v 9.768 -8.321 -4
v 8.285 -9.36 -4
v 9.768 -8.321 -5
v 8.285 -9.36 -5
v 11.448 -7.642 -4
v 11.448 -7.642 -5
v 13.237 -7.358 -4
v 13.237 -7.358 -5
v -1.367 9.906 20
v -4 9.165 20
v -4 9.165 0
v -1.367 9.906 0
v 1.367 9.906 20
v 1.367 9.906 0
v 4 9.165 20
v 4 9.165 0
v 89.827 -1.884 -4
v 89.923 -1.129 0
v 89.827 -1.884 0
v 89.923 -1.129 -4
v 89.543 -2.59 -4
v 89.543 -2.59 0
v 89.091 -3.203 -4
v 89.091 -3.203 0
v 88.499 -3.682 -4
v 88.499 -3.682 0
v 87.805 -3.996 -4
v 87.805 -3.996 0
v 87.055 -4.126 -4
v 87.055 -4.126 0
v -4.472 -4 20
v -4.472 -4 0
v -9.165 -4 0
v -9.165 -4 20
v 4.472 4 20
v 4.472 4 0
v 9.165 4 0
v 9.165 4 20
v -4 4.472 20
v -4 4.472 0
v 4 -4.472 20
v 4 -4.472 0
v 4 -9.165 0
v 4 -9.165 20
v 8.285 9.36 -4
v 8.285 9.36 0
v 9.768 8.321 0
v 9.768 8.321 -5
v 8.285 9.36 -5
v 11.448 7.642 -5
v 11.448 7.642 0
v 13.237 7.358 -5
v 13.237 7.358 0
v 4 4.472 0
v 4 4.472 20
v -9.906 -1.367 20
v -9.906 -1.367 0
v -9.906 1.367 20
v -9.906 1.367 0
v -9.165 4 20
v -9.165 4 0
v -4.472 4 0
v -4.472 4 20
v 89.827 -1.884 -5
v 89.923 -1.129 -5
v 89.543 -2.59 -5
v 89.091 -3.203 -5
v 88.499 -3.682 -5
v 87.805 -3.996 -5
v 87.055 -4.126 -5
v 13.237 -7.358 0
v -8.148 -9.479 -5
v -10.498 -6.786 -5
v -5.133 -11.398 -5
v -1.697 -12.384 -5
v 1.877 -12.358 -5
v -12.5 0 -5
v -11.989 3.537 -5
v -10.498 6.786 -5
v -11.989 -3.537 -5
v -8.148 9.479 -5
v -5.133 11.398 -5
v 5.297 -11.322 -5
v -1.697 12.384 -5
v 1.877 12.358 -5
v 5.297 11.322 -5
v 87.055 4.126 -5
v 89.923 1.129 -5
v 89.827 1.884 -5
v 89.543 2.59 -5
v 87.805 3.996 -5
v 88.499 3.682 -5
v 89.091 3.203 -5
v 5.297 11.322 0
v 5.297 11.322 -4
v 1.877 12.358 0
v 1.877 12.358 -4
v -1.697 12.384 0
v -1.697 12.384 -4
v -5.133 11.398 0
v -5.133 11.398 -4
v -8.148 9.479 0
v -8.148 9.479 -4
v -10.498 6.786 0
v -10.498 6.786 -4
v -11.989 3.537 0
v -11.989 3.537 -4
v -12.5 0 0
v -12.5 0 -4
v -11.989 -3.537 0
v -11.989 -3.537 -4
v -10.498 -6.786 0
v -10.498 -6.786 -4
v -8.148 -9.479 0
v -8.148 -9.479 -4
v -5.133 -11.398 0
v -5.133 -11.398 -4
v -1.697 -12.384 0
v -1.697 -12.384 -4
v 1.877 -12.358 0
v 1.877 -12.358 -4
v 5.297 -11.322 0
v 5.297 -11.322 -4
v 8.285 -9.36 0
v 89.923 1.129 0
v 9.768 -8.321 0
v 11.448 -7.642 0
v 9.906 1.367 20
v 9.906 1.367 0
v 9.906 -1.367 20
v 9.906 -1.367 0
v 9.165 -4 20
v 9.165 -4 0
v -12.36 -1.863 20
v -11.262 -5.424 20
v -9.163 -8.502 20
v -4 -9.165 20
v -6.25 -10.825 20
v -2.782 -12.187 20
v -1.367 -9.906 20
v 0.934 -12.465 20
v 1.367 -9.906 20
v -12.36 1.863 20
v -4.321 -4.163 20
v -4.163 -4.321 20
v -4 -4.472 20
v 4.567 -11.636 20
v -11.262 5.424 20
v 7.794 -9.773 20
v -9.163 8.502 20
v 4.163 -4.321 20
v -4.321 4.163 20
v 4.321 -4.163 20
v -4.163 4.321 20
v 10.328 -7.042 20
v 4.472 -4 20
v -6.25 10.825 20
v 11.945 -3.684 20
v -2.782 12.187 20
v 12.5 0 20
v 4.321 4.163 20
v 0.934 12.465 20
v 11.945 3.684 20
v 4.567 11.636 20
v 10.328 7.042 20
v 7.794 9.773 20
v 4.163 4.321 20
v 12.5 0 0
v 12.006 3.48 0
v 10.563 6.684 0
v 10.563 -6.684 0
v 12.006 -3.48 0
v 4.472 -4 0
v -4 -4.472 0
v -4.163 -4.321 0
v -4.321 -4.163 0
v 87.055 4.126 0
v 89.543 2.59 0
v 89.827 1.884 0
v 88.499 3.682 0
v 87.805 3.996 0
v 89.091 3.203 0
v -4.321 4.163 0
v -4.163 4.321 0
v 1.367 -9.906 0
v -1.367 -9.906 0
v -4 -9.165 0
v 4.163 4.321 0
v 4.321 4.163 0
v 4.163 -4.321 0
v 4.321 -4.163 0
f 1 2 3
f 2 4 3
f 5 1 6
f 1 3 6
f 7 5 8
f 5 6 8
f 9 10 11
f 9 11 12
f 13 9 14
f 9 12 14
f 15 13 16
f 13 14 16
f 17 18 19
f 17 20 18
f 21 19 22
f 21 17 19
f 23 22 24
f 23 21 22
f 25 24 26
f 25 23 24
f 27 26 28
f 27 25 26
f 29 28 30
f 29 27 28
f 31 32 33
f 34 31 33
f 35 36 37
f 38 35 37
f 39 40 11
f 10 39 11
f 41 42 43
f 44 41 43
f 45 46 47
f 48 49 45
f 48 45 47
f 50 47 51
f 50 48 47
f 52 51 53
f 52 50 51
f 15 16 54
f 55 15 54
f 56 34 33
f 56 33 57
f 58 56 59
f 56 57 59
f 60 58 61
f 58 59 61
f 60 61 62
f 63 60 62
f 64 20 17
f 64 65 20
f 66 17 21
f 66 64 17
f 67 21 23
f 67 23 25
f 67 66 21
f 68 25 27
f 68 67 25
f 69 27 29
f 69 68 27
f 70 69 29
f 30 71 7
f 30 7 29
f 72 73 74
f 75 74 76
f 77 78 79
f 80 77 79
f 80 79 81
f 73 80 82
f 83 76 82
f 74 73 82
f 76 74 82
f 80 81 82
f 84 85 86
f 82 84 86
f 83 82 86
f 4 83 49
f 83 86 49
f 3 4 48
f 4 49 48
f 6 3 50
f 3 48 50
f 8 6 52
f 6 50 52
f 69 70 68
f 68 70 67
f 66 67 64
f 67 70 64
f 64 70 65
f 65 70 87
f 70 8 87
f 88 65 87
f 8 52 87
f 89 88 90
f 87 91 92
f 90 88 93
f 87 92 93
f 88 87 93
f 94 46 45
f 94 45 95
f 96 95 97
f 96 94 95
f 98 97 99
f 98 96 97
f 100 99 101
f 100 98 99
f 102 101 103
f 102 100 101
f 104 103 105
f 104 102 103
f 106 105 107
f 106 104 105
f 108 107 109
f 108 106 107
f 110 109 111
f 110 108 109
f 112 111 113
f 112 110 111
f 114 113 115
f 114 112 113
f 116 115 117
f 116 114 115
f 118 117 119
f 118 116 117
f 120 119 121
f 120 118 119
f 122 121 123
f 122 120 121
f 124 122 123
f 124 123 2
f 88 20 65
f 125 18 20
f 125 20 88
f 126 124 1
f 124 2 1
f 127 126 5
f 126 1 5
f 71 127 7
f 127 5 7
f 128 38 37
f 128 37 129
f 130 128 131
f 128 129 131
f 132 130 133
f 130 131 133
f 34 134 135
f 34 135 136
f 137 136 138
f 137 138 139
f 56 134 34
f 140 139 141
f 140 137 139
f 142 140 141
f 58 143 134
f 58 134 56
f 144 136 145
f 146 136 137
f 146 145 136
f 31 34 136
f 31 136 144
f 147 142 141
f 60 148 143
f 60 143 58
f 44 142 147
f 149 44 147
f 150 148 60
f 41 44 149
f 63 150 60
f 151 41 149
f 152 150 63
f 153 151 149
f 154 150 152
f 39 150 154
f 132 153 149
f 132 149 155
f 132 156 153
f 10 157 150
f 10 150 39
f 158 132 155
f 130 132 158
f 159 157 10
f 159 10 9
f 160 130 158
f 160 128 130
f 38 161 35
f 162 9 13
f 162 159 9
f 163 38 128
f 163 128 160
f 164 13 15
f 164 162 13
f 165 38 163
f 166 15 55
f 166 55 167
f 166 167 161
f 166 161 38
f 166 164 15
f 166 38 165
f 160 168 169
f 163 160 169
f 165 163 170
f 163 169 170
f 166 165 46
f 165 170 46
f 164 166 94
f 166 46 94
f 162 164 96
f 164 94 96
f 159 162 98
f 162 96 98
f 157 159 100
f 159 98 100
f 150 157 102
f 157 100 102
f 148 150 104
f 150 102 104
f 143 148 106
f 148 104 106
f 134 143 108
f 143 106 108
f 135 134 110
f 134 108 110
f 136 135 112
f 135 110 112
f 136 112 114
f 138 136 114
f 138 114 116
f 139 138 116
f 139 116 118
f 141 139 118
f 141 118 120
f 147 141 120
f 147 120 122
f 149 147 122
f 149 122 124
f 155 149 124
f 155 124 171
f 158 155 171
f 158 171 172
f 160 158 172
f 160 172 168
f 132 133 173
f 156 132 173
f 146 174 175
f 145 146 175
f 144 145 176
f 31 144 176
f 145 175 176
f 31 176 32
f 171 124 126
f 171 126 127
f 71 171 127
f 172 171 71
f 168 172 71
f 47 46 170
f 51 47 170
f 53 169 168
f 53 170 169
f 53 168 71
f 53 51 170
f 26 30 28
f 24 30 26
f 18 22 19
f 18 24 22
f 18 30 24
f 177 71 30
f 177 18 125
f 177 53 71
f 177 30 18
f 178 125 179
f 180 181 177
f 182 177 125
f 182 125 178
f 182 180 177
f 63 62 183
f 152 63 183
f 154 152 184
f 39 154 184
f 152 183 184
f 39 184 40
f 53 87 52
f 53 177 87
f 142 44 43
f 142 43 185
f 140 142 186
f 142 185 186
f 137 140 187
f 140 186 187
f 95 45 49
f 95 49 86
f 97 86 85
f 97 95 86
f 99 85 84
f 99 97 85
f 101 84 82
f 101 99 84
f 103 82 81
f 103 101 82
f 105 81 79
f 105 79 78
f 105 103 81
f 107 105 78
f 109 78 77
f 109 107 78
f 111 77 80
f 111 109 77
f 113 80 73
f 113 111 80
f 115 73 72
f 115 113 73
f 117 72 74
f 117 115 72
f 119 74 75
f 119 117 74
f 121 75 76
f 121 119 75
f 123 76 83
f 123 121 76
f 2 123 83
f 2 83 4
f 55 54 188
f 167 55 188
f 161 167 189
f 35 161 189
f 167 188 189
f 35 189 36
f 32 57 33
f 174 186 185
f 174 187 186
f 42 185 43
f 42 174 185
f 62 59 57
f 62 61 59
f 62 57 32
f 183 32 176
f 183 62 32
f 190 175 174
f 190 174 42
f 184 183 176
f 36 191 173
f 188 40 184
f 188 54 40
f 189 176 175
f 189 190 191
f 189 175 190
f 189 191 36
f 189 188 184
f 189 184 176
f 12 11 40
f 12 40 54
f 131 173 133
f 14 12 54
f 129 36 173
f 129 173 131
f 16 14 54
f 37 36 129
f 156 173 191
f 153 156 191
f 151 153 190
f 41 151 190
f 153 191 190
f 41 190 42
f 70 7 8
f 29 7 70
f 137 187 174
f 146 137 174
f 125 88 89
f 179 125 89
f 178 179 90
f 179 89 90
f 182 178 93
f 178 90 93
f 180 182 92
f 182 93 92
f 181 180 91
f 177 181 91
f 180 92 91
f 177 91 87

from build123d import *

# Parameters (mm, degrees)
F0_R     = 12.5
F1_DEPTH = 20
F3_DEPTH = 5
F4_DEPTH = 4
F5_R     = 8
F6_R     = 3


with BuildPart() as f1:
    # F0 (on Top) → F1 (new body)
    with BuildSketch(Plane.XY):
        Circle(F0_R)
        with BuildLine():
            ThreePointArc((-9.1651513899, -4), (-10, 0), (-9.1651513899, 4))
            Line((-9.1651513899, 4), (-4.472135955, 4))
            ThreePointArc((-4.472135955, 4), (-4.2426406871, 4.2426406871), (-4, 4.472135955))
            Line((-4, 4.472135955), (-4, 9.1651513899))
            ThreePointArc((-4, 9.1651513899), (0, 10), (4, 9.1651513899))
            Line((4, 9.1651513899), (4, 4.472135955))
            ThreePointArc((4, 4.472135955), (4.2426406871, 4.2426406871), (4.472135955, 4))
            Line((4.472135955, 4), (9.1651513899, 4))
            ThreePointArc((9.1651513899, 4), (10, 0), (9.1651513899, -4))
            Line((9.1651513899, -4), (4.472135955, -4))
            ThreePointArc((4.472135955, -4), (4.2426406871, -4.2426406871), (4, -4.472135955))
            Line((4, -4.472135955), (4, -9.1651513899))
            ThreePointArc((4, -9.1651513899), (0, -10), (-4, -9.1651513899))
            Line((-4, -9.1651513899), (-4, -4.472135955))
            ThreePointArc((-4, -4.472135955), (-4.2426406871, -4.2426406871), (-4.472135955, -4))
            Line((-4.472135955, -4), (-9.1651513899, -4))
        make_face(mode=Mode.SUBTRACT)
    extrude(amount=F1_DEPTH)

    # F2 (on Top) → F3 (join)
    with BuildSketch(Plane.XY):
        with BuildLine():
            ThreePointArc((10, -7.5), (11.8585412256, -3.9528470752), (12.5, 0))
            ThreePointArc((12.5, 0), (11.8585412256, 3.9528470752), (10, 7.5))
            ThreePointArc((10, 7.5), (-12.5, 0), (10, -7.5))
        make_face()
        with BuildLine():
            ThreePointArc((10, 7.5), (11.8585412256, 3.9528470752), (12.5, 0))
            ThreePointArc((12.5, 0), (11.8585412256, -3.9528470752), (10, -7.5))
            Line((10, -7.5), (89.9234008285, -4))
            Line((89.9234008285, -4), (89.9234008285, 0))
            Line((89.9234008285, 0), (89.9234008285, 4))
            Line((89.9234008285, 4), (10, 7.5))
        make_face()
    extrude(amount=-F3_DEPTH)

    # F2 (on Top) → F4 (join)
    with BuildSketch(Plane.XY):
        with BuildLine():
            ThreePointArc((10, -7.5), (11.8585412256, -3.9528470752), (12.5, 0))
            ThreePointArc((12.5, 0), (11.8585412256, 3.9528470752), (10, 7.5))
            ThreePointArc((10, 7.5), (-12.5, 0), (10, -7.5))
        make_face()
        with BuildLine():
            ThreePointArc((10, 7.5), (11.8585412256, 3.9528470752), (12.5, 0))
            ThreePointArc((12.5, 0), (11.8585412256, -3.9528470752), (10, -7.5))
            Line((10, -7.5), (89.9234008285, -4))
            Line((89.9234008285, -4), (89.9234008285, 0))
            Line((89.9234008285, 0), (89.9234008285, 4))
            Line((89.9234008285, 4), (10, 7.5))
        make_face()
    extrude(amount=-F4_DEPTH)

    # F5
    f5_edges = [f1.edges().sort_by_distance(p)[0] for p in [
        (10, 7.5, -2.5),
        (10, -7.5, -2.5),
    ]]
    fillet(f5_edges, radius=F5_R)

    # F6
    f6_edges = [f1.edges().sort_by_distance(p)[0] for p in [
        (89.923401, 4, -2.5),
        (89.923401, -4, -2.5),
    ]]
    fillet(f6_edges, radius=F6_R)


solid = f1.part
